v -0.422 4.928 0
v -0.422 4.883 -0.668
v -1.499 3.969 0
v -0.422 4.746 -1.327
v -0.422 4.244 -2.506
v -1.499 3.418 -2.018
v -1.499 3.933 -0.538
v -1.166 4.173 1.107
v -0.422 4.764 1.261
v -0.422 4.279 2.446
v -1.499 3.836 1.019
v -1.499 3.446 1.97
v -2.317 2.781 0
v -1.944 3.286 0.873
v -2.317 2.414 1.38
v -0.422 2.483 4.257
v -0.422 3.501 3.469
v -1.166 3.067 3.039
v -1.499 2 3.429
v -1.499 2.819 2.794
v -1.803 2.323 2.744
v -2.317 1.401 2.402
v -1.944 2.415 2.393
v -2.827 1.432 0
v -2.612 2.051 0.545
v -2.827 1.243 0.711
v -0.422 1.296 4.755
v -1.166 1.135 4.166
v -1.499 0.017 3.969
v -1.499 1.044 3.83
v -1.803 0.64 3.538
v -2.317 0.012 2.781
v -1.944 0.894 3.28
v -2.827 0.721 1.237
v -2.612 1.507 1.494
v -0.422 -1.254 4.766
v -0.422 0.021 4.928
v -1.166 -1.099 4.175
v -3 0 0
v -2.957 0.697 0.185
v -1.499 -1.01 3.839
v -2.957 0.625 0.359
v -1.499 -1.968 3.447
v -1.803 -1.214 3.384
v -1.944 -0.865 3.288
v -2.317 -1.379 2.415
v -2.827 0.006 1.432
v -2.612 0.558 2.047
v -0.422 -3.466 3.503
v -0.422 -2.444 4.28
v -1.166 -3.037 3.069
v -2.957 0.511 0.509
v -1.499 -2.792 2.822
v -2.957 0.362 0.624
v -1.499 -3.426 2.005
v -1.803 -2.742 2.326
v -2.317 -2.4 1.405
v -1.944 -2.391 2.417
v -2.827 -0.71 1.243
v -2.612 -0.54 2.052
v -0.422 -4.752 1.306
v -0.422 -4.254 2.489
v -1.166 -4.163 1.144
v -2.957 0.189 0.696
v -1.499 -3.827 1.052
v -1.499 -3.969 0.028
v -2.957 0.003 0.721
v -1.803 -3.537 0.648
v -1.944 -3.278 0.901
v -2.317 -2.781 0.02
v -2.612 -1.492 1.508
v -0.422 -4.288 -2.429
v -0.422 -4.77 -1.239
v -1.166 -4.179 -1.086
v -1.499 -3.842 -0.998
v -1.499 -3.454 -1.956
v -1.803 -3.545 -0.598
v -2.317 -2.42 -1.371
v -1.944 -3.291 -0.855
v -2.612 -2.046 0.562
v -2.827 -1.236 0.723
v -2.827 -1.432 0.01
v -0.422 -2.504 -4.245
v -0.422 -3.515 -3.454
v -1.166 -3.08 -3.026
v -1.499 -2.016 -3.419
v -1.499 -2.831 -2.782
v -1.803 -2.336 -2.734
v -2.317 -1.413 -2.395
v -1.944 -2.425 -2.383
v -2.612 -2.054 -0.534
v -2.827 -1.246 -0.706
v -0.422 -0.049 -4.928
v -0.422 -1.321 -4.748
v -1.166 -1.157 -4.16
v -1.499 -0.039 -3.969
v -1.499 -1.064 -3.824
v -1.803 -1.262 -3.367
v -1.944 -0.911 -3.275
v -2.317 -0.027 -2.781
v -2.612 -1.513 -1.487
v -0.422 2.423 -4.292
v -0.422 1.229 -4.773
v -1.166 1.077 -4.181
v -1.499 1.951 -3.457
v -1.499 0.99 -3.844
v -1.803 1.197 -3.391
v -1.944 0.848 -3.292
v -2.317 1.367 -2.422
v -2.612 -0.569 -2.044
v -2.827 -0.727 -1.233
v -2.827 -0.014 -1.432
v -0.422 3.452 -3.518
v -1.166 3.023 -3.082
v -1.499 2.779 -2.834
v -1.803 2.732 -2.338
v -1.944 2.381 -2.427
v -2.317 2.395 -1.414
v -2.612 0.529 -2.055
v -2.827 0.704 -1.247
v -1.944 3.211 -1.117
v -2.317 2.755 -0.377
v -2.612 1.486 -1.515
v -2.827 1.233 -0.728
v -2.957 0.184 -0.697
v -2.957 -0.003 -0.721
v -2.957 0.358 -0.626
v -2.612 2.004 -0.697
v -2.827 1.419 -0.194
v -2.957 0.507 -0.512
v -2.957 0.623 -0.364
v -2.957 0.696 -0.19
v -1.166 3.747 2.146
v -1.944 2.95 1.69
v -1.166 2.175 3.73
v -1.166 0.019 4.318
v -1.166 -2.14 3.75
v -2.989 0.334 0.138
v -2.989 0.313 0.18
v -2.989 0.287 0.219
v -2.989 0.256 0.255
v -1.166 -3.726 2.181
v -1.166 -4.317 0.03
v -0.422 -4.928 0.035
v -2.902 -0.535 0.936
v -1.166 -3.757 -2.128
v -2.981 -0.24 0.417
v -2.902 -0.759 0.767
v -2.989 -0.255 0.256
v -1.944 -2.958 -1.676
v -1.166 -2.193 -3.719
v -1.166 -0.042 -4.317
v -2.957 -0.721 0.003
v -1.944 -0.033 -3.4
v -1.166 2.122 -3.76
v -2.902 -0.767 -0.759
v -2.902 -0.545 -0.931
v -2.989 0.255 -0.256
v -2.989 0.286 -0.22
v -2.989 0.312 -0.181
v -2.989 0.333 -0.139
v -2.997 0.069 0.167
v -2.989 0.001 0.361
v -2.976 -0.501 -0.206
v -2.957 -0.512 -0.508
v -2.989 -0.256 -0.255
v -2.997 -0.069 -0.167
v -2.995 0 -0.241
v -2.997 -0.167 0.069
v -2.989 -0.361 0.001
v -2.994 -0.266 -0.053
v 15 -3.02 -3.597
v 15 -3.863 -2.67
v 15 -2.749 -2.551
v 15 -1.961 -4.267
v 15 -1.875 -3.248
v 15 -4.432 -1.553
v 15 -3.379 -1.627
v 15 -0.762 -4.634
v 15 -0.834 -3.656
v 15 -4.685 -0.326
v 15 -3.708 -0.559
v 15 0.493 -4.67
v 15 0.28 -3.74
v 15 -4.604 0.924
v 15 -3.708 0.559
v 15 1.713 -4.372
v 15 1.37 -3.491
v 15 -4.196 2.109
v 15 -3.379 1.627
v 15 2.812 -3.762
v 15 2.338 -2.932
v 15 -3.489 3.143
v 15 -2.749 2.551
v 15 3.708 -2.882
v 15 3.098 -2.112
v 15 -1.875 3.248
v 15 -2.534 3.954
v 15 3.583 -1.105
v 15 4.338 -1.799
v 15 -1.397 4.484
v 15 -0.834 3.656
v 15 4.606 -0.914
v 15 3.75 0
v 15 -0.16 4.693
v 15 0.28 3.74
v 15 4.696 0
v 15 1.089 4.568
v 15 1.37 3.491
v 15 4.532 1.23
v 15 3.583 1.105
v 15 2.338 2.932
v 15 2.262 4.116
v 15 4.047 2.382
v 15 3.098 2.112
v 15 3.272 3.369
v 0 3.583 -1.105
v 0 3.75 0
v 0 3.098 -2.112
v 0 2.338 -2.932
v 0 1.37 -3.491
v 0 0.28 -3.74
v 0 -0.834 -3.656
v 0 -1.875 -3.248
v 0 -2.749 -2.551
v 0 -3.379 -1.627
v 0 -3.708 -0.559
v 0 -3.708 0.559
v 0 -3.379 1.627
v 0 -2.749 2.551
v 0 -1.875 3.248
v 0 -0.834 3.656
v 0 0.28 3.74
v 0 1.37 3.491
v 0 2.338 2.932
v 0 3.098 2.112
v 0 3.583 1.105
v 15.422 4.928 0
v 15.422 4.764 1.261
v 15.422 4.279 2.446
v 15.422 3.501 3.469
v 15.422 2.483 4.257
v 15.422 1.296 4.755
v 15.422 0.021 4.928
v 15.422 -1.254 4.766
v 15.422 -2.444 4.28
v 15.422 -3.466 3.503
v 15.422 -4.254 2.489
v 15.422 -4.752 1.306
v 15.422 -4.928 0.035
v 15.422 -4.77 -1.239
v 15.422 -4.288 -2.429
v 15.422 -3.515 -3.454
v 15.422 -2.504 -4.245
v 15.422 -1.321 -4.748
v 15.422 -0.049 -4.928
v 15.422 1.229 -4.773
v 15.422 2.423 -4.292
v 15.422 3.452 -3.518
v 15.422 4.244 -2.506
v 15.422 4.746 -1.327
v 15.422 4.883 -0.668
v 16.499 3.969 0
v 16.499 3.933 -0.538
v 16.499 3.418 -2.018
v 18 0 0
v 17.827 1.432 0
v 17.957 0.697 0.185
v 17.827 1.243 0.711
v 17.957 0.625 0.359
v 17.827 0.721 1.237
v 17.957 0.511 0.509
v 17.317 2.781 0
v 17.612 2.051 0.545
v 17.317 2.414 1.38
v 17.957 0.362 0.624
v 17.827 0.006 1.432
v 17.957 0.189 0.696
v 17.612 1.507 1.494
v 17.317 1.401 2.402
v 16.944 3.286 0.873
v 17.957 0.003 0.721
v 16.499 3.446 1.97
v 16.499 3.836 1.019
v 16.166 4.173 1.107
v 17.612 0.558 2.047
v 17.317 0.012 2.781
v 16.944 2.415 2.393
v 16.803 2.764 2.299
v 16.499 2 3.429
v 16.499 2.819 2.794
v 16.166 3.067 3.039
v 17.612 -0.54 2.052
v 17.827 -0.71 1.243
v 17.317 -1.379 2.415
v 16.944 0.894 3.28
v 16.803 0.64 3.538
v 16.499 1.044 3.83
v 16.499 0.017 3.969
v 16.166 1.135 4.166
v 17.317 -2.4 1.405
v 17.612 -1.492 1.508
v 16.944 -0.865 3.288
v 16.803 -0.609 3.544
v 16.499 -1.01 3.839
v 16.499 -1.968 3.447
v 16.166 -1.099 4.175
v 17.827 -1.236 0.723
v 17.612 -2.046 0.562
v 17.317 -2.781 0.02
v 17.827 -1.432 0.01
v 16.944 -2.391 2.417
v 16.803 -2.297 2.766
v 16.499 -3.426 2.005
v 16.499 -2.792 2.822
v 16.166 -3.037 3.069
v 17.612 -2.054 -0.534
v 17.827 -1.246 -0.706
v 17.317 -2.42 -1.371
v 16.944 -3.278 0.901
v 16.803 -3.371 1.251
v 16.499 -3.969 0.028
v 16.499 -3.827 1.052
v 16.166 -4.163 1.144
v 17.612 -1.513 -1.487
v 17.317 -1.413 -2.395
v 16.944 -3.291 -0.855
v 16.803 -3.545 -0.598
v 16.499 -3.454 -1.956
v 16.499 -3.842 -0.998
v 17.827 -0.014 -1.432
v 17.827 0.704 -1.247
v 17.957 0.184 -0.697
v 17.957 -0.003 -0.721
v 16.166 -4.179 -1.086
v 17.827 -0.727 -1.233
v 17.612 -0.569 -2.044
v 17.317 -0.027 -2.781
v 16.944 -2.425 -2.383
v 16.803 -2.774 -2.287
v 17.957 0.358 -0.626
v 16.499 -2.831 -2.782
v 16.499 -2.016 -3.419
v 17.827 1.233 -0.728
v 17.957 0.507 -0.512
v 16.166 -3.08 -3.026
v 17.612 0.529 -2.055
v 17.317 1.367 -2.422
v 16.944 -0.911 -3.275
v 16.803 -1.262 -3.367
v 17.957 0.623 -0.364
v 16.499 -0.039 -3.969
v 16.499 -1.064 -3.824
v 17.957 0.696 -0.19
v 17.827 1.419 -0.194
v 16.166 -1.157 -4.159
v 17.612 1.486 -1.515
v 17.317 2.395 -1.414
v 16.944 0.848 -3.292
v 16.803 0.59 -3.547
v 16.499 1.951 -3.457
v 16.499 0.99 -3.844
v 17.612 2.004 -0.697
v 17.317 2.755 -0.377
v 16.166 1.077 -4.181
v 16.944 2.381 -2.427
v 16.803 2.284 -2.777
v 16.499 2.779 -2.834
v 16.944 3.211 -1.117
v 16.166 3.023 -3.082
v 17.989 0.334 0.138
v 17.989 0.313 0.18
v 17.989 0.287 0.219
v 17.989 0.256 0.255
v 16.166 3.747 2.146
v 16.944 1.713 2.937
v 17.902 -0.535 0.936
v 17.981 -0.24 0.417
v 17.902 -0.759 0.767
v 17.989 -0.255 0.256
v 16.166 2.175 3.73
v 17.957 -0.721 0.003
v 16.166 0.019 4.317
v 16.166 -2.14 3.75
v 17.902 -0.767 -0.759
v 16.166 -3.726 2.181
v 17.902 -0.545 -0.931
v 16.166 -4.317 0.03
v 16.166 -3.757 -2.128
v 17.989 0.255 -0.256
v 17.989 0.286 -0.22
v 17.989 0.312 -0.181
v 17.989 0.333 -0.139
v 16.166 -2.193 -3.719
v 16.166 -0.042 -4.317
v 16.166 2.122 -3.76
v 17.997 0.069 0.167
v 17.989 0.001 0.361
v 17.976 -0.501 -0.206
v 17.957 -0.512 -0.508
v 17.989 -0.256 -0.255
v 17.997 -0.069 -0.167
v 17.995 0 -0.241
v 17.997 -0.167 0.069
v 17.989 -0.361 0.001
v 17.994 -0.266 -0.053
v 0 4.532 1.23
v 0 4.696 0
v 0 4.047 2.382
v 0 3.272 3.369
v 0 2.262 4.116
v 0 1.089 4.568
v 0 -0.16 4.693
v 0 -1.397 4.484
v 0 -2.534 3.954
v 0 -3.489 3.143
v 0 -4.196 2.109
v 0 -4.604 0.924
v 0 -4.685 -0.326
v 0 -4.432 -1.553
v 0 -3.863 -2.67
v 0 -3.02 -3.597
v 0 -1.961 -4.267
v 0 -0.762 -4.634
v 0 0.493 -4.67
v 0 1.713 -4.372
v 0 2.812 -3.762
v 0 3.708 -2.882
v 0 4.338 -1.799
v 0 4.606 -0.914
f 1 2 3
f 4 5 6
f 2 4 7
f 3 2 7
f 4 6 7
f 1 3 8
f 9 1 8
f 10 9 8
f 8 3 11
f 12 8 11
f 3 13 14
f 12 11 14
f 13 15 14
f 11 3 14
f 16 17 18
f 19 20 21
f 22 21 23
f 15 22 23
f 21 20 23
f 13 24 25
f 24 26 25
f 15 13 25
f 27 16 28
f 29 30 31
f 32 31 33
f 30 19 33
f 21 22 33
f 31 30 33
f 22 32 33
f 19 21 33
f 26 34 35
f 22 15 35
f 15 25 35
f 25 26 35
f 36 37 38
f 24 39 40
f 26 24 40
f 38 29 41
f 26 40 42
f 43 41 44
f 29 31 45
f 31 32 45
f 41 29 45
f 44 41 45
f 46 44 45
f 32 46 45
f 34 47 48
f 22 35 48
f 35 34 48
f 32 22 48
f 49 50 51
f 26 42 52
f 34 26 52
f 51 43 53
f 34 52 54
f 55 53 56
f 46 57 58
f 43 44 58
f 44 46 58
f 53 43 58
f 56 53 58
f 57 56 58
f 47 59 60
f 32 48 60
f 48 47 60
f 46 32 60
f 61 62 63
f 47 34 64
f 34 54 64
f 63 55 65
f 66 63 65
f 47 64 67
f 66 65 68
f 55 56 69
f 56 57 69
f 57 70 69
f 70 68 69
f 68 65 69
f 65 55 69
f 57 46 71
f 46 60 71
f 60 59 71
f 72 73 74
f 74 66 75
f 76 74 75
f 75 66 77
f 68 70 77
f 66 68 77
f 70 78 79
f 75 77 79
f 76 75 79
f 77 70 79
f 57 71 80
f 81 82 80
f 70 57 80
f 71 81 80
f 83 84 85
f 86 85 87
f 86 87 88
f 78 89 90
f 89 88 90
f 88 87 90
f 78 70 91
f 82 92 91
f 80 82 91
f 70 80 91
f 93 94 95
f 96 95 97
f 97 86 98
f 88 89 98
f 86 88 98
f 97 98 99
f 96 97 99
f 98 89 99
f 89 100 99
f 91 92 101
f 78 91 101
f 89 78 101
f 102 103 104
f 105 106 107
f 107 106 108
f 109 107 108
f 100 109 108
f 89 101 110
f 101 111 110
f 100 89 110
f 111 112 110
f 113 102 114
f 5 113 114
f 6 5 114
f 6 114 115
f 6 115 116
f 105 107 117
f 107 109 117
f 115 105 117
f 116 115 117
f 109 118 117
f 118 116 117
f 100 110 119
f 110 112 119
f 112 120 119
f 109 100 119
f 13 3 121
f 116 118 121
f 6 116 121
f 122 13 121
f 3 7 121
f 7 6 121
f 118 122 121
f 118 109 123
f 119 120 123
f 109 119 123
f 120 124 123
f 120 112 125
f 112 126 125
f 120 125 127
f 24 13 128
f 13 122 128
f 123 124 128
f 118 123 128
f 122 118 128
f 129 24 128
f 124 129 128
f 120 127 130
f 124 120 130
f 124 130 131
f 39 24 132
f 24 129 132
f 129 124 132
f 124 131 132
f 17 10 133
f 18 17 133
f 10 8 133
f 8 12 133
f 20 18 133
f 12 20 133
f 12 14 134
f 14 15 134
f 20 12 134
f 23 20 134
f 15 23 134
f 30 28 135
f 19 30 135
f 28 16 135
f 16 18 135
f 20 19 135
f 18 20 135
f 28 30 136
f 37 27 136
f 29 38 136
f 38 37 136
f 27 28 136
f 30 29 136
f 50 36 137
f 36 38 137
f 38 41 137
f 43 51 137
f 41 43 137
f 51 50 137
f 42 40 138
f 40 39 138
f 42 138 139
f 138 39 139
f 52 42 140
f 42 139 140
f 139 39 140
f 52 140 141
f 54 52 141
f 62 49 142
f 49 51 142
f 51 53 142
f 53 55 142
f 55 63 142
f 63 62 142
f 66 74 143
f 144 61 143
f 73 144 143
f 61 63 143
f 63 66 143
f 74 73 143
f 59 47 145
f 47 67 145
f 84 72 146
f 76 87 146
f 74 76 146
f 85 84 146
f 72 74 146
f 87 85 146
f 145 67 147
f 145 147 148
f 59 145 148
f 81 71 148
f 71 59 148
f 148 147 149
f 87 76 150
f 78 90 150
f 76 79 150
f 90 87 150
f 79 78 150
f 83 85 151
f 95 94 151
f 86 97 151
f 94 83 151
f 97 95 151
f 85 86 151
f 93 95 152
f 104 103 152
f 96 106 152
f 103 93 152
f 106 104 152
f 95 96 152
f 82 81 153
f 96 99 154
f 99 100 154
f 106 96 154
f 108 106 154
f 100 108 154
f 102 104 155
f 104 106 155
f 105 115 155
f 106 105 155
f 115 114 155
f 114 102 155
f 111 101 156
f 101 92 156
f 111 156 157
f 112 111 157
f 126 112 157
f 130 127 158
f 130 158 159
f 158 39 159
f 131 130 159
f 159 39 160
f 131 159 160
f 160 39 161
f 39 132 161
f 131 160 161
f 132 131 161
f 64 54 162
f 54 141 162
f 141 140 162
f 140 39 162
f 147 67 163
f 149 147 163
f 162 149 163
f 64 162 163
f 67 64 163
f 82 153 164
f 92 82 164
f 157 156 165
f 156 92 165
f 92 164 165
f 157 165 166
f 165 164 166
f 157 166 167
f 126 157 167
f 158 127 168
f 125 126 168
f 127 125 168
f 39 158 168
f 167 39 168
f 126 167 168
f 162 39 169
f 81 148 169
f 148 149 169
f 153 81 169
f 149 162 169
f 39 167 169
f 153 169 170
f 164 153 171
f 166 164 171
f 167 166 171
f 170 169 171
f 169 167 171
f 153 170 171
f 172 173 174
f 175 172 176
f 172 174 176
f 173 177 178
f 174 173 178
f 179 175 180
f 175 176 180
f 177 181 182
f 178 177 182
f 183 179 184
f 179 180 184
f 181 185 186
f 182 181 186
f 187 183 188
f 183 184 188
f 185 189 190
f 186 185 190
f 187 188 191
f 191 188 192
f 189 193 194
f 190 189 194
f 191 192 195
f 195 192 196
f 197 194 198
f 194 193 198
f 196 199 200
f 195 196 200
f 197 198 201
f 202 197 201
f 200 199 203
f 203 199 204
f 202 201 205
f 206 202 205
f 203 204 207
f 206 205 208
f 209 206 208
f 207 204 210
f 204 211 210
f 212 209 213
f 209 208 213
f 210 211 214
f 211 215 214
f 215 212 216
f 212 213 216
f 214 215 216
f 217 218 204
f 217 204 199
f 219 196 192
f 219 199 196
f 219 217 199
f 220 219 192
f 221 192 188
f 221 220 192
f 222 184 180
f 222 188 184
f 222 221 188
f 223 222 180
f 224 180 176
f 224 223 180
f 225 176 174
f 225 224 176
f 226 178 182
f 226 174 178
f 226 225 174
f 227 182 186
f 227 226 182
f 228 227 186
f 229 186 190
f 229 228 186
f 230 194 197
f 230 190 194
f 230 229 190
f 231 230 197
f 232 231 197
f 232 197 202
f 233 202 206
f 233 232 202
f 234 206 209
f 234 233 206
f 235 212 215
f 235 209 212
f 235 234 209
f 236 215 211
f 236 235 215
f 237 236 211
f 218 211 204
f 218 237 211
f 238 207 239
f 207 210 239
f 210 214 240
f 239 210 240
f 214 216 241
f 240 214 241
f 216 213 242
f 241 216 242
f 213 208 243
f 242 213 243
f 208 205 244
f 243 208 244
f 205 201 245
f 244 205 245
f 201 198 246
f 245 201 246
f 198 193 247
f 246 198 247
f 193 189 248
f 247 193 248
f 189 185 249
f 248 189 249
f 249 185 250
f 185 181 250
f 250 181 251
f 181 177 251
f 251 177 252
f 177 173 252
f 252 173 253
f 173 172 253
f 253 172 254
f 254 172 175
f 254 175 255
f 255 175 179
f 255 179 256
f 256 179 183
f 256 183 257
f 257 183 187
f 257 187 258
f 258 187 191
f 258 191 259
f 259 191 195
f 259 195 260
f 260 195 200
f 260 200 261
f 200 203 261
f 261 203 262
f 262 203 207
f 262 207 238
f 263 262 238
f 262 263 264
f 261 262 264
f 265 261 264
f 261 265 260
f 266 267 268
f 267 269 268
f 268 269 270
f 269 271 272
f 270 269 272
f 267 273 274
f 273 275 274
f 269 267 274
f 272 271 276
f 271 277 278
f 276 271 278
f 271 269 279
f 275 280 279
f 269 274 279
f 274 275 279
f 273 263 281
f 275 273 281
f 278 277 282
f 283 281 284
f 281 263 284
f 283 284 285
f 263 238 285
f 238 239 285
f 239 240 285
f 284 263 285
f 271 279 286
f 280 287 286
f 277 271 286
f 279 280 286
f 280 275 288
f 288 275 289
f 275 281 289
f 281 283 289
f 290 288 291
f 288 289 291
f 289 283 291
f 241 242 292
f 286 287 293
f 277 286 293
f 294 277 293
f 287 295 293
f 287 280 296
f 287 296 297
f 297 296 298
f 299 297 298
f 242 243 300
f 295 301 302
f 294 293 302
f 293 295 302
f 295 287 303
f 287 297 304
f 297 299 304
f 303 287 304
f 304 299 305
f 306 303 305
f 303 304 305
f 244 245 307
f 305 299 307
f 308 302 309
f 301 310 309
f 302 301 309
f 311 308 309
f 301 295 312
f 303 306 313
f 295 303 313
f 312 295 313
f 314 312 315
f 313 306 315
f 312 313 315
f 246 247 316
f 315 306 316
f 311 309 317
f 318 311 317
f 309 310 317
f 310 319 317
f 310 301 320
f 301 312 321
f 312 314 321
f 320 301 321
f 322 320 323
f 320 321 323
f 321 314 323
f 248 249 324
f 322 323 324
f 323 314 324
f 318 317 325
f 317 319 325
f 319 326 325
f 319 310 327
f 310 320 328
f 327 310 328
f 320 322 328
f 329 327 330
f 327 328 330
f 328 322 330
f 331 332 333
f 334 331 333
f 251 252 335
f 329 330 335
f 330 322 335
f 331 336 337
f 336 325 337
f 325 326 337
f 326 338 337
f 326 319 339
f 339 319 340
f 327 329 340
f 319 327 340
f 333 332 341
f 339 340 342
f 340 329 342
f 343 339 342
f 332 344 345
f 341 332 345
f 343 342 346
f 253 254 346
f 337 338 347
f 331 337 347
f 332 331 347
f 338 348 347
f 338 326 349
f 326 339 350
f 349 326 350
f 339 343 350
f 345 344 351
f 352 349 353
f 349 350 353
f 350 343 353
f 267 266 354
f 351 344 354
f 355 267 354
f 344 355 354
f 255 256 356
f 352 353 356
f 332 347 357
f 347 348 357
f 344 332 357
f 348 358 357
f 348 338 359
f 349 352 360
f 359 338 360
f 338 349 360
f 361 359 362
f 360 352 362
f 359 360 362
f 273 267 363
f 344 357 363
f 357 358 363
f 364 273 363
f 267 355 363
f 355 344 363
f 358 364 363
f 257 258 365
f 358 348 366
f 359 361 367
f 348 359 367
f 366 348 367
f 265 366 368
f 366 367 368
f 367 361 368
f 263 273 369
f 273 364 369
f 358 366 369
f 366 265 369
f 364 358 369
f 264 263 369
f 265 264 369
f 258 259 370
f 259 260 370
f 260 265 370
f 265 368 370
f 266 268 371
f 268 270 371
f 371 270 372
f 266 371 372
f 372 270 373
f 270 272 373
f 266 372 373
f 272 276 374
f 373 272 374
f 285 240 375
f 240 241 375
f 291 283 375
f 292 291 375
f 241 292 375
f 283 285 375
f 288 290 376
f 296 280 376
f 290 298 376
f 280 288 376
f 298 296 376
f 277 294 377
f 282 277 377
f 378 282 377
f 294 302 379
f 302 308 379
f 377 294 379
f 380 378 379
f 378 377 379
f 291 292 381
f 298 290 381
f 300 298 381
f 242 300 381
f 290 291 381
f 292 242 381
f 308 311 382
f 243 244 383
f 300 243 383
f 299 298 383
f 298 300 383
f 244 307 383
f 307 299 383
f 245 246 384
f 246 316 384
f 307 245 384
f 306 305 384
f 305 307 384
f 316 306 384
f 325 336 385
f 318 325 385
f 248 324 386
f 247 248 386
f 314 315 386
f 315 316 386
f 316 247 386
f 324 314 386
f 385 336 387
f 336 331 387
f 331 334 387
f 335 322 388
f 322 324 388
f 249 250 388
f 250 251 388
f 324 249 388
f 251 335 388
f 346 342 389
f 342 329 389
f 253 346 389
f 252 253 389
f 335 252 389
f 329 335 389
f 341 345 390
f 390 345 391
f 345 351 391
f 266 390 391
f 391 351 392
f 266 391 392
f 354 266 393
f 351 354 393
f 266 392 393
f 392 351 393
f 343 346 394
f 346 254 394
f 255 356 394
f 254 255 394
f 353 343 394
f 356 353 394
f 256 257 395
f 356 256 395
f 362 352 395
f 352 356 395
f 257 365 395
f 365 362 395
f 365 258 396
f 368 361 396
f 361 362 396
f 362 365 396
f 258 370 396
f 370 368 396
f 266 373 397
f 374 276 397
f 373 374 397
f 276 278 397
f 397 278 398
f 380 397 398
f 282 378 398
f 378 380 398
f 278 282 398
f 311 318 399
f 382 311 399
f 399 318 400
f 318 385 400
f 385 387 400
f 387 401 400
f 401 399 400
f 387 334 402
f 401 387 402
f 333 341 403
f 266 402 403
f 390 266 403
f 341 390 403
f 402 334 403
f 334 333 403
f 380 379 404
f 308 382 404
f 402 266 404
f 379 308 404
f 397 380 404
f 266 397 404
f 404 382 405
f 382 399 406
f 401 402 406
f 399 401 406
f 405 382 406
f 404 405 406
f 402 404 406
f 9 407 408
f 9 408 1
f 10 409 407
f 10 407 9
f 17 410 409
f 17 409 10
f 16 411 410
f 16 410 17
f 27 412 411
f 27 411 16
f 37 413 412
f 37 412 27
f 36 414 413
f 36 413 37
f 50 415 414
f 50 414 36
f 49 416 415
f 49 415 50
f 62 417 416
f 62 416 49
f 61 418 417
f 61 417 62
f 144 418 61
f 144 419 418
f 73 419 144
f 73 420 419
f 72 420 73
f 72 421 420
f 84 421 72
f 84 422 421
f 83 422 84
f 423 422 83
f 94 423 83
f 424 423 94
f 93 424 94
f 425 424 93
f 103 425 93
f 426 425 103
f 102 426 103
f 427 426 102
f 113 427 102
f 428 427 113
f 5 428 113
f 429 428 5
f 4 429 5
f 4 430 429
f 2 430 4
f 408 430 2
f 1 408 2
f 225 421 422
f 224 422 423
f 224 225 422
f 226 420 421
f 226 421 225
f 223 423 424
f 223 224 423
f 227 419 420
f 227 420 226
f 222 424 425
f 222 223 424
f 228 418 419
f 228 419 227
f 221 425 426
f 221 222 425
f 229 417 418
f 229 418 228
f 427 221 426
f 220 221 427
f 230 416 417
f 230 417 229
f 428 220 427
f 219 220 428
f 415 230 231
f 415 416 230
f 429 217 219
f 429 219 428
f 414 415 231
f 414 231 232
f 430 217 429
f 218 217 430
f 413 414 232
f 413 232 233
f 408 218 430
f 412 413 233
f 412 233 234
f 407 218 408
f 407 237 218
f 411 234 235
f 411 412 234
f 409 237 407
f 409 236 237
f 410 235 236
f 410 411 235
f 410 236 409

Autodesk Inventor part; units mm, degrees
ref_plane "YZ Plane" through (0, 0, 0) normal (1, 0, 0) x (0, 1, 0)
ref_plane "XZ Plane" through (0, 0, 0) normal (0, 1, 0) x (-1, 0, 0)
ref_plane "XY Plane" through (0, 0, 0) normal (0, 0, 1) x (1, 0, 0)
sketch "Sketch1" plane through (0, 0, 0) normal (0, 0, 1) x (1, 0, 0)
  line L0 (0, 0) -> (15, 0)
  line L1 (15, 0) -> (15, 3.75)
  line L2 (15, 3.75) -> (0, 3.75)
  line L3 (0, 3.75) -> (0, 0)
  line L4 (0, 3.75) -> (0, 5.1962)
  line L5 (15, 3.75) -> (15, 5.1962)
  arc A0 (18, 0) -> (15, 5.1962) centre (12, 0) ccw
  arc A1 (0, 5.1962) -> (-3, 0) centre (3, 0) ccw
  line L6 (0, 0) -> (-3, 0)
  line L7 (15, 0) -> (18, 0)
  dimension "d0" = 15
  dimension "d1" = 3.75
  dimension "d2" = 6
  dimension "d3" = 6
  dimension "d4" = 3
  dimension "d5" = 3
revolve "Revolution1" add sketch "Sketch1" angle 360 about axis through (0, 0, 0) along (1, 0, 0)
chamfer "Chamfer1" distance 0.5 angle 45 2 edges at (0, -5.1962, 0) (15, -5.1962, 0)
properties part number "Claw Axis(1)" material "Stainless Steel"
